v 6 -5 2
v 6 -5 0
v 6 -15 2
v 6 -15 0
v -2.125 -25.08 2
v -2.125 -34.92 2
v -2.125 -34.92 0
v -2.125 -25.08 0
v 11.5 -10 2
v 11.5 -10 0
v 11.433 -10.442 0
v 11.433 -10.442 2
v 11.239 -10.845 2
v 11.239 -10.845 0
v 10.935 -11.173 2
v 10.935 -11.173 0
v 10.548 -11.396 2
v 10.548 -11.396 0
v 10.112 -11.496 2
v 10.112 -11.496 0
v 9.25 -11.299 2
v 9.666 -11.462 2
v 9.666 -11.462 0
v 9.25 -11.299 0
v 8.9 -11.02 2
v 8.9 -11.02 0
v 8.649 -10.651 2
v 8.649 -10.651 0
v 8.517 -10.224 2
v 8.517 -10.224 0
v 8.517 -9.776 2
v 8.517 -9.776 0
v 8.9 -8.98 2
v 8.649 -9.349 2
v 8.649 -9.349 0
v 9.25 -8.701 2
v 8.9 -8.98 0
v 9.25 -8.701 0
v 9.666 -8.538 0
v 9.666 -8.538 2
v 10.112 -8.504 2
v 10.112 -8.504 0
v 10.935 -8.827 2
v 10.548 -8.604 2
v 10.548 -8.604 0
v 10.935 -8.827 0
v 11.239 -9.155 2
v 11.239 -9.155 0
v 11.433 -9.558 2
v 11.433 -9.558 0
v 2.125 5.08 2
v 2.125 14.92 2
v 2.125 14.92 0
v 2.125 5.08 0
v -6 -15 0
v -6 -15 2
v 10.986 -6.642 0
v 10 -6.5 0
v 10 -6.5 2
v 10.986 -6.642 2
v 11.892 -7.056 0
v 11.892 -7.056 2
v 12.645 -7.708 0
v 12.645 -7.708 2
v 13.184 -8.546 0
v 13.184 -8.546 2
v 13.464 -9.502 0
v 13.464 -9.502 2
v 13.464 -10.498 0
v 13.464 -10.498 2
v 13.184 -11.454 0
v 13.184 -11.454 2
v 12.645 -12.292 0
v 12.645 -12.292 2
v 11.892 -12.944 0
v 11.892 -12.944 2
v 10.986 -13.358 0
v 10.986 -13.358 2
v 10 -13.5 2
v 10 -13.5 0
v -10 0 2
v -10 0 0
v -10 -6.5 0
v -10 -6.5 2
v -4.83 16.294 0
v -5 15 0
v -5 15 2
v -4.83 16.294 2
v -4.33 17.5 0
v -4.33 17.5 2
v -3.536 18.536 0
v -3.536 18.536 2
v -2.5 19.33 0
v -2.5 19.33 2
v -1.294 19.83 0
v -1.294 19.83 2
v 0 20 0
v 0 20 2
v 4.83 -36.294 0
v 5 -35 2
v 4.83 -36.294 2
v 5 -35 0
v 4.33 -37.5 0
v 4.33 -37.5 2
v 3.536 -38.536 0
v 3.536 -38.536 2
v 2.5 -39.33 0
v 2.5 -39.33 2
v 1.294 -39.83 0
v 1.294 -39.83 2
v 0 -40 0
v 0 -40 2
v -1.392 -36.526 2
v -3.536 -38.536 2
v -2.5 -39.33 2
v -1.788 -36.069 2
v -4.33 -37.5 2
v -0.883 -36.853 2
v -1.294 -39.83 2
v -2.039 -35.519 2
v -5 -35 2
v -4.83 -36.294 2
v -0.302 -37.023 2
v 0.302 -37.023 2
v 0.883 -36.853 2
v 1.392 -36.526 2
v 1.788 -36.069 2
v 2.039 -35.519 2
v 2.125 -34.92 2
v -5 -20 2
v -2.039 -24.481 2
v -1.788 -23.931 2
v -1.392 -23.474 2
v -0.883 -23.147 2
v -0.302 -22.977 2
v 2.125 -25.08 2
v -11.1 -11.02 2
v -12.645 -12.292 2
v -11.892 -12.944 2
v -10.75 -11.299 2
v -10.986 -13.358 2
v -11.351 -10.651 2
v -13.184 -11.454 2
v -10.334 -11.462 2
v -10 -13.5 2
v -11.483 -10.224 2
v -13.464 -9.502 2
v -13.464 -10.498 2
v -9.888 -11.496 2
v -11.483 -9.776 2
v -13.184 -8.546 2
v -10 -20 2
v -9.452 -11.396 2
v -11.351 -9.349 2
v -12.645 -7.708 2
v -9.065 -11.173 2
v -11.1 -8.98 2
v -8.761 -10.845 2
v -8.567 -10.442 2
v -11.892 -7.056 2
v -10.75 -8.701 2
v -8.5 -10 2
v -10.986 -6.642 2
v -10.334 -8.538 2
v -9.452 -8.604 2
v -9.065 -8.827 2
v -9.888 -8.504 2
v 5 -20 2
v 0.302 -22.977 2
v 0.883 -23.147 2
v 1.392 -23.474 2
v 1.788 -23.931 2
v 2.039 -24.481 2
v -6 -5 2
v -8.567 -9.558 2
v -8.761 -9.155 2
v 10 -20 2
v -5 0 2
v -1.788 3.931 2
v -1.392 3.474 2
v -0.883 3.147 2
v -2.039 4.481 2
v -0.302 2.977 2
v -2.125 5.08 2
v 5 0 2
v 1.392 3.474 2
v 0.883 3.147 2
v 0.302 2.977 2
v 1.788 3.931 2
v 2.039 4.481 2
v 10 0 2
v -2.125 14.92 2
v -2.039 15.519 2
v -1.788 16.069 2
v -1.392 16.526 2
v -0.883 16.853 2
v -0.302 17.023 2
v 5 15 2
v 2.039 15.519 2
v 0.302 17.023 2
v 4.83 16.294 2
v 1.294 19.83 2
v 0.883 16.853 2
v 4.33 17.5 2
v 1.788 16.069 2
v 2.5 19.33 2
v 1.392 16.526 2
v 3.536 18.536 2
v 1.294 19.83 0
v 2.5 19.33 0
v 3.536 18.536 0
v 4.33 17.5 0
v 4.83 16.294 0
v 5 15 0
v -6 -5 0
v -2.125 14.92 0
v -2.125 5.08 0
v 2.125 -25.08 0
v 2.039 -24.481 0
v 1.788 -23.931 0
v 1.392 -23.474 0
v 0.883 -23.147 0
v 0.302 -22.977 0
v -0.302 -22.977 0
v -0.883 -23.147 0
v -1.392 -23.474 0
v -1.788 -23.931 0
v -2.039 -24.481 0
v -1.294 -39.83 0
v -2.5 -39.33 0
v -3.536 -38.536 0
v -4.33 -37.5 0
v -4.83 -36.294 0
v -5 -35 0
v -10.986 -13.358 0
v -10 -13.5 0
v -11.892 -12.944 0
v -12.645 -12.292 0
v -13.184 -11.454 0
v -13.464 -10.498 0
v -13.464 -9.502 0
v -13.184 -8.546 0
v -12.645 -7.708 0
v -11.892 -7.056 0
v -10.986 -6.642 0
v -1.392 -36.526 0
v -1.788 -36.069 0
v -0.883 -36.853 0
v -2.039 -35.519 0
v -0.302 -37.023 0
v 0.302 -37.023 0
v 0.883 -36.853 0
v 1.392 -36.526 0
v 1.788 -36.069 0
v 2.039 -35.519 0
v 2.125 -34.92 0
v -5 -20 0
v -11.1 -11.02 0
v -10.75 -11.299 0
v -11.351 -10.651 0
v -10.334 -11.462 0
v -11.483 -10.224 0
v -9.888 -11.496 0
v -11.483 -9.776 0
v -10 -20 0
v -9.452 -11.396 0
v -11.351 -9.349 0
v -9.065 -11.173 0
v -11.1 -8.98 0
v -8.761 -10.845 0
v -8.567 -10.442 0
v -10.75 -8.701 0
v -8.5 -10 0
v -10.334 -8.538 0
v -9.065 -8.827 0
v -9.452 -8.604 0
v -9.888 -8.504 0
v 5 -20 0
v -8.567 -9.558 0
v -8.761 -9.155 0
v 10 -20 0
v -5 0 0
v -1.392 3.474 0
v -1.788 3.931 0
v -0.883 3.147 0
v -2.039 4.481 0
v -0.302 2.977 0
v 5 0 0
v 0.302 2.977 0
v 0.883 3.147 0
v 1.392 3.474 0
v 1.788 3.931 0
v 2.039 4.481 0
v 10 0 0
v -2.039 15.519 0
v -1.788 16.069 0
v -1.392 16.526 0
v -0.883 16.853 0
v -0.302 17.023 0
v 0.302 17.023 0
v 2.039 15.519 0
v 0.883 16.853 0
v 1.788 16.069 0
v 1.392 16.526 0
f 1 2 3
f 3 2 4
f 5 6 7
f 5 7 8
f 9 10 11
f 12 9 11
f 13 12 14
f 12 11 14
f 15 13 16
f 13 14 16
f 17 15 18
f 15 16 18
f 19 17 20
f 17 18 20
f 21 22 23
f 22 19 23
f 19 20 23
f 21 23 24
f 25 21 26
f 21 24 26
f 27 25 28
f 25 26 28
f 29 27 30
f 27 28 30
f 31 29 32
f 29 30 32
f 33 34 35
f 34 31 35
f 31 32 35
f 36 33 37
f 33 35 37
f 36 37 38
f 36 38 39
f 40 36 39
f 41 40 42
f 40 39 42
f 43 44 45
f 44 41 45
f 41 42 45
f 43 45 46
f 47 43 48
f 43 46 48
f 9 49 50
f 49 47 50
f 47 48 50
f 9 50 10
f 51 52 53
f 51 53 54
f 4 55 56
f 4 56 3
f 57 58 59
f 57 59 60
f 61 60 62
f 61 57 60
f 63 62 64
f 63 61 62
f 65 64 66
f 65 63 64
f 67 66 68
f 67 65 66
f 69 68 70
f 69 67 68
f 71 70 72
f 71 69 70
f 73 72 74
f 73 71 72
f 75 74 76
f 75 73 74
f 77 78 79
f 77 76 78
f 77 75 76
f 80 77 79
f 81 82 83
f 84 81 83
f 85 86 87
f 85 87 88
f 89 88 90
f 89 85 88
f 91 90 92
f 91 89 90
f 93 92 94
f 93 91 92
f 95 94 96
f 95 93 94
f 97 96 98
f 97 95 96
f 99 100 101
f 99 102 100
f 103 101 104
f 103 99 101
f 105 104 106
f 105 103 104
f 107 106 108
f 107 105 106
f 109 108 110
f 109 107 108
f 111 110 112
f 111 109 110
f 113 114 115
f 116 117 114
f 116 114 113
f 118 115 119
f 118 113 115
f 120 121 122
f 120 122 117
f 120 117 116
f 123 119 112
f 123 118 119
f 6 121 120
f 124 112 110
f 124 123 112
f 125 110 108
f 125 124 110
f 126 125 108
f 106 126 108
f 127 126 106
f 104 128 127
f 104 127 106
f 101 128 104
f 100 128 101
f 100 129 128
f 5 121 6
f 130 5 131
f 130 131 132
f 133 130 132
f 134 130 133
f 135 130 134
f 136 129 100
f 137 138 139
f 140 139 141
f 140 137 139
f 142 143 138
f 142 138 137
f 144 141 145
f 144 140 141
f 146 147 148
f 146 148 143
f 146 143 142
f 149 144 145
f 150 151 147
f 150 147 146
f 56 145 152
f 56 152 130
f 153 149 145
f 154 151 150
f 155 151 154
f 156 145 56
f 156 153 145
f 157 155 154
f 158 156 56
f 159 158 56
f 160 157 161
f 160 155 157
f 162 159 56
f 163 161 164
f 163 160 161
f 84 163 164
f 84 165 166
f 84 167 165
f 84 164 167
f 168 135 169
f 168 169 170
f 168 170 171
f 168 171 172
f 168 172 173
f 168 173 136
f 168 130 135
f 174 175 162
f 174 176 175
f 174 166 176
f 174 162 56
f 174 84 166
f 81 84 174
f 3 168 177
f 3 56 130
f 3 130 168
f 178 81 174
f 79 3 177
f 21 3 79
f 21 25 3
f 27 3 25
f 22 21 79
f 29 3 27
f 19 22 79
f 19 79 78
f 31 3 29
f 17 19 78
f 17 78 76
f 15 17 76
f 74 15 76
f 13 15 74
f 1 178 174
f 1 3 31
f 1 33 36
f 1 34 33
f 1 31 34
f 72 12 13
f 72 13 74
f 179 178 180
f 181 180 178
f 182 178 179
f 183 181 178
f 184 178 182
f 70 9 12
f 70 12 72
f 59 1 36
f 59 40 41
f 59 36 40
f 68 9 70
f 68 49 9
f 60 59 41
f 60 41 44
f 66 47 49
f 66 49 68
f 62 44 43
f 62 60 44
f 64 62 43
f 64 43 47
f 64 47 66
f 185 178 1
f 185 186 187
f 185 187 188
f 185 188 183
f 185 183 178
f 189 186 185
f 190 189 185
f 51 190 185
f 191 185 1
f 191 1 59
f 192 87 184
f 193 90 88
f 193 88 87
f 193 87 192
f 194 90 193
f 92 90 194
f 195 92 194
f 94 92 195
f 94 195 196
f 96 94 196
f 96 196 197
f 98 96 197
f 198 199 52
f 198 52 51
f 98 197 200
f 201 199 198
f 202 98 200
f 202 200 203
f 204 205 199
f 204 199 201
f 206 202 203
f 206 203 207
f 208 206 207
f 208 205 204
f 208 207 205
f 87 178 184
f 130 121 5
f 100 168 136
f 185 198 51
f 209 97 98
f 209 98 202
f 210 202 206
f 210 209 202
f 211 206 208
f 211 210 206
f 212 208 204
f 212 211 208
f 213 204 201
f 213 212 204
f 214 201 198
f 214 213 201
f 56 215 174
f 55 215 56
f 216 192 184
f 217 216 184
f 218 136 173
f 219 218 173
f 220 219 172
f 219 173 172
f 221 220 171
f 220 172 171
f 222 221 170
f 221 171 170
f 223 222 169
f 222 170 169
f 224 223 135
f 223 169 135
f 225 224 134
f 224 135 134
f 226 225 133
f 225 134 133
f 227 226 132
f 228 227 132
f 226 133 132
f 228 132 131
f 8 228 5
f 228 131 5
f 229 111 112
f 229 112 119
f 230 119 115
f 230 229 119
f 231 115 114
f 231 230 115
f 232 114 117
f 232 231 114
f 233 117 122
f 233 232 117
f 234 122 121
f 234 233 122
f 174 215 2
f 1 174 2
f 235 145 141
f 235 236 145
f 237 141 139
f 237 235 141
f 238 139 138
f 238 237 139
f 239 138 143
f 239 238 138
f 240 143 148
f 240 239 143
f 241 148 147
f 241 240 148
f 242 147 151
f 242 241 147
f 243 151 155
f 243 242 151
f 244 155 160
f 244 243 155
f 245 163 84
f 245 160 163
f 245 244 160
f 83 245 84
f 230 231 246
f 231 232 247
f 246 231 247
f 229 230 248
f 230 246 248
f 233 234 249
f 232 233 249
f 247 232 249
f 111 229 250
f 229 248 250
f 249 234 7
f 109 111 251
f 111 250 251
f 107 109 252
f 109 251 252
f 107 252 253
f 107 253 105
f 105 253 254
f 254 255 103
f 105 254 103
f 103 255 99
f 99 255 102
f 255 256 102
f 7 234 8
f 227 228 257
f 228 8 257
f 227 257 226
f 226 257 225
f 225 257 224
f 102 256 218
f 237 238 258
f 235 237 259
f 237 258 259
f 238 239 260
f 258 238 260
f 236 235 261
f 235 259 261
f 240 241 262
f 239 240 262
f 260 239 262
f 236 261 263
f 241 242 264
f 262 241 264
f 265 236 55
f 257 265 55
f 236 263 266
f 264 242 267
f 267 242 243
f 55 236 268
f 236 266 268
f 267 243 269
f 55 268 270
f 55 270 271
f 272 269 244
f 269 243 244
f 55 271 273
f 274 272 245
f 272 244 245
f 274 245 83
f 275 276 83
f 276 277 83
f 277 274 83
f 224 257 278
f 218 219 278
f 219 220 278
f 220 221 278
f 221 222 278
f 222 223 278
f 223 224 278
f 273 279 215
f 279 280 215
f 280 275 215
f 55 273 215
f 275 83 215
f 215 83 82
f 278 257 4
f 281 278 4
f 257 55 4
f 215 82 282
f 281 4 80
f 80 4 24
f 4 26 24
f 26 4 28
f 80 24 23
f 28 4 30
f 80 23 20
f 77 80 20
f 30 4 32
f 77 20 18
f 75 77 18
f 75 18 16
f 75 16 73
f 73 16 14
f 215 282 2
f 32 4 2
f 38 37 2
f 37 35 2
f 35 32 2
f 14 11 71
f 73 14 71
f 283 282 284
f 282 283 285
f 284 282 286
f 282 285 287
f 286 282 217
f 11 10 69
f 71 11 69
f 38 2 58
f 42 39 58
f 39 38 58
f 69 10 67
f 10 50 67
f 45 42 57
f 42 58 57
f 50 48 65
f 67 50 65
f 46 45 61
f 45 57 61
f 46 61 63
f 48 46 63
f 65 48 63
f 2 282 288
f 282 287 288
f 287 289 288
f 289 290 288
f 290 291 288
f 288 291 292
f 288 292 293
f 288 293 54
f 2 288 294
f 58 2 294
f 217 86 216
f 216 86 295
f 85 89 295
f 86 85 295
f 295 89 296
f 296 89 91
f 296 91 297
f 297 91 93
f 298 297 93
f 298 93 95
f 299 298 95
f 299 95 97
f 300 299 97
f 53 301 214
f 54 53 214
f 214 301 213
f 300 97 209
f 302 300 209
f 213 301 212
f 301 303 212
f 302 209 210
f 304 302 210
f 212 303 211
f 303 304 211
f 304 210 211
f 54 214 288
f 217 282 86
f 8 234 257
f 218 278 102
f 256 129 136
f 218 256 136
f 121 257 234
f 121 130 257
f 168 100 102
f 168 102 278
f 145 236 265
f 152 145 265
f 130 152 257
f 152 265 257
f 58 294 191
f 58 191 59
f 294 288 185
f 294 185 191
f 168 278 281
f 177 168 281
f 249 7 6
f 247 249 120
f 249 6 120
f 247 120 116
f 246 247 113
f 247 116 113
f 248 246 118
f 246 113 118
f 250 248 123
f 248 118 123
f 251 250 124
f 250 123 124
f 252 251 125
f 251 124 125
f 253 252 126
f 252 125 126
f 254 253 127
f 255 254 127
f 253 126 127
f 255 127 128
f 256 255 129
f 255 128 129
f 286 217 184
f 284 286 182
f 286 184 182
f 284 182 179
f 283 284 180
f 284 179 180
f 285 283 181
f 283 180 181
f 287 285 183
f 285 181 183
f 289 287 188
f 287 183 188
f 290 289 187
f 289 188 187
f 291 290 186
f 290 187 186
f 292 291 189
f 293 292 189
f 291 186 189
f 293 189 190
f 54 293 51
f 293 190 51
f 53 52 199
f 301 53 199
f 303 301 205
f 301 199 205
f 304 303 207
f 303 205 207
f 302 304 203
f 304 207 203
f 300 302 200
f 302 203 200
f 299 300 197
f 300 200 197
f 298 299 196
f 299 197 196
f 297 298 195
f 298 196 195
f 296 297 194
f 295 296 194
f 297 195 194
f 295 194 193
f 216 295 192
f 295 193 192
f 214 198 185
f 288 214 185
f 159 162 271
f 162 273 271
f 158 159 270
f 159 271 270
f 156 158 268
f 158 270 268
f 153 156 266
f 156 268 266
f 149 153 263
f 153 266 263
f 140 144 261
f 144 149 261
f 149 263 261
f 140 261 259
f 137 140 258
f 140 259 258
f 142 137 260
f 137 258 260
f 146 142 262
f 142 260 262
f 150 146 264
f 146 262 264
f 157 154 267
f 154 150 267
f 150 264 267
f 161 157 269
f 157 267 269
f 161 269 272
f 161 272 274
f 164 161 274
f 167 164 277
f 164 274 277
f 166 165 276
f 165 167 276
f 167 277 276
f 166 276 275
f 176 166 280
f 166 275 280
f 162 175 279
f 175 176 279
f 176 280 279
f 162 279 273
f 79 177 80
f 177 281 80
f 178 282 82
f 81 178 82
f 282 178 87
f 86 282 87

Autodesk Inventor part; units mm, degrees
ref_plane "YZ Plane" through (0, 0, 0) normal (1, 0, 0) x (0, 1, 0)
ref_plane "XZ Plane" through (0, 0, 0) normal (0, 1, 0) x (-1, 0, 0)
ref_plane "XY Plane" through (0, 0, 0) normal (0, 0, 1) x (1, 0, 0)
sketch "Sketch1" plane through (0, 0, 0) normal (0, 0, 1) x (1, 0, 0)
  line L0 (0, 0) -> (10, 0)
  line L1 (0, 0) -> (-10, 0)
  line L2 (-10, 0) -> (-10, -6.5)
  line L3 (10, 0) -> (10, -6.5)
  line L4 (-10, 0) -> (10, 0)
  line L5 (-10, -20) -> (10, -20)
  line L6 (-10, -6.5) -> (-10, -5)
  line L7 (-6, -5) -> (6, -5)
  line L8 (-6, -15) -> (6, -15)
  line L9 (6, -5) -> (6, -15)
  line L10 (-6, -5) -> (-6, -15)
  line L11 (-10, 0) -> (-10, -6.5)
  line L12 (-10, -13.5) -> (-10, -20)
  line L13 (10, -20) -> (10, -13.5)
  line L14 (10, -6.5) -> (10, 0)
  circle A0 centre (10, -10) radius 1.5
  arc A1 (10, -13.5) -> (10, -6.5) centre (10, -10) ccw
  circle A2 centre (-10, -10) radius 1.5
  arc A3 (-10, -6.5) -> (-10, -13.5) centre (-10, -10) ccw
  dimension "d0" = 10
  dimension "d1" = 10
  dimension "d2" = 20
  dimension "d7" = 3
  dimension "d8" = 7
  dimension "d9" = 3
  dimension "d10" = 7
extrude "Extrusion1" add sketch "Sketch1" along normal blind 2
thread "Thread2" size "M3x0.5" class "6H" standard "ANSI Metric M Profile" full length
thread "Thread3" size "M3x0.5" class "6H" standard "ANSI Metric M Profile" full length
sketch "Sketch6" plane through (0, 0, 2) normal (0, 0, 1) x (1, 0, 0)
  line L0 (10, 0) -> (-10, 0) projected
  line L1 (-5, 0) -> (-5, 20)
  line L2 (-5, 0) -> (15, 0) construction
  line L3 (-5, 20) -> (5, 20)
  line L4 (5, 20) -> (5, 0)
  arc A0 (-10, -6.5) -> (-10, -13.5) centre (-10, -10) ccw projected
  arc A1 (10, -13.5) -> (10, -6.5) centre (10, -10) ccw projected
  line L5 (0, 20) -> (0, 9.84)
  circle A2 centre (0, 14.92) radius 2.125
  line L6 (0, 0) -> (0, 10.16)
  circle A3 centre (0, 5.08) radius 2.125
  line L7 (-2.125, 14.92) -> (-2.125, 5.08)
  line L8 (2.125, 14.92) -> (2.125, 5.08)
  line L9 (-13.5, -10) -> (13.5, -10)
  line L10 (10, -20) -> (-10, -20)
  line L11 (-5, -20) -> (-5, -40)
  line L12 (-5, -40) -> (5, -40)
  line L13 (5, -40) -> (5, -20)
  line L14 (0, -40) -> (0, -29.84)
  circle A4 centre (0, -34.92) radius 2.125
  line L15 (0, -20) -> (0, -30.16)
  circle A5 centre (0, -25.08) radius 2.125
  line L16 (-2.125, -34.92) -> (-2.125, -25.08)
  line L17 (2.125, -34.92) -> (2.125, -25.08)
  dimension "d45" = 20
  dimension "d47" = 10
  dimension "d52" = 10.16
  dimension "d53" = 4.25
  dimension "d54" = 10.16
  dimension "d55" = 4.25
extrude "Extrusion7" add sketch "Sketch6" against normal blind 2 contours L0 L6 A3 L8 A2 L5 L3 L4 | L0 L1 L3 L5 A2 L7 A3 L6 | L13 L12 L14 A4 L17 A5 L15 L10 | L15 A5 L16 A4 L14 L12 L11 L10
fillet "Fillet2" radius 5 4 edges at (5, -40, 1) (-5, -40, 1) (5, 20, 1) (-5, 20, 1)
properties part number "Time of Flight Attachment"
